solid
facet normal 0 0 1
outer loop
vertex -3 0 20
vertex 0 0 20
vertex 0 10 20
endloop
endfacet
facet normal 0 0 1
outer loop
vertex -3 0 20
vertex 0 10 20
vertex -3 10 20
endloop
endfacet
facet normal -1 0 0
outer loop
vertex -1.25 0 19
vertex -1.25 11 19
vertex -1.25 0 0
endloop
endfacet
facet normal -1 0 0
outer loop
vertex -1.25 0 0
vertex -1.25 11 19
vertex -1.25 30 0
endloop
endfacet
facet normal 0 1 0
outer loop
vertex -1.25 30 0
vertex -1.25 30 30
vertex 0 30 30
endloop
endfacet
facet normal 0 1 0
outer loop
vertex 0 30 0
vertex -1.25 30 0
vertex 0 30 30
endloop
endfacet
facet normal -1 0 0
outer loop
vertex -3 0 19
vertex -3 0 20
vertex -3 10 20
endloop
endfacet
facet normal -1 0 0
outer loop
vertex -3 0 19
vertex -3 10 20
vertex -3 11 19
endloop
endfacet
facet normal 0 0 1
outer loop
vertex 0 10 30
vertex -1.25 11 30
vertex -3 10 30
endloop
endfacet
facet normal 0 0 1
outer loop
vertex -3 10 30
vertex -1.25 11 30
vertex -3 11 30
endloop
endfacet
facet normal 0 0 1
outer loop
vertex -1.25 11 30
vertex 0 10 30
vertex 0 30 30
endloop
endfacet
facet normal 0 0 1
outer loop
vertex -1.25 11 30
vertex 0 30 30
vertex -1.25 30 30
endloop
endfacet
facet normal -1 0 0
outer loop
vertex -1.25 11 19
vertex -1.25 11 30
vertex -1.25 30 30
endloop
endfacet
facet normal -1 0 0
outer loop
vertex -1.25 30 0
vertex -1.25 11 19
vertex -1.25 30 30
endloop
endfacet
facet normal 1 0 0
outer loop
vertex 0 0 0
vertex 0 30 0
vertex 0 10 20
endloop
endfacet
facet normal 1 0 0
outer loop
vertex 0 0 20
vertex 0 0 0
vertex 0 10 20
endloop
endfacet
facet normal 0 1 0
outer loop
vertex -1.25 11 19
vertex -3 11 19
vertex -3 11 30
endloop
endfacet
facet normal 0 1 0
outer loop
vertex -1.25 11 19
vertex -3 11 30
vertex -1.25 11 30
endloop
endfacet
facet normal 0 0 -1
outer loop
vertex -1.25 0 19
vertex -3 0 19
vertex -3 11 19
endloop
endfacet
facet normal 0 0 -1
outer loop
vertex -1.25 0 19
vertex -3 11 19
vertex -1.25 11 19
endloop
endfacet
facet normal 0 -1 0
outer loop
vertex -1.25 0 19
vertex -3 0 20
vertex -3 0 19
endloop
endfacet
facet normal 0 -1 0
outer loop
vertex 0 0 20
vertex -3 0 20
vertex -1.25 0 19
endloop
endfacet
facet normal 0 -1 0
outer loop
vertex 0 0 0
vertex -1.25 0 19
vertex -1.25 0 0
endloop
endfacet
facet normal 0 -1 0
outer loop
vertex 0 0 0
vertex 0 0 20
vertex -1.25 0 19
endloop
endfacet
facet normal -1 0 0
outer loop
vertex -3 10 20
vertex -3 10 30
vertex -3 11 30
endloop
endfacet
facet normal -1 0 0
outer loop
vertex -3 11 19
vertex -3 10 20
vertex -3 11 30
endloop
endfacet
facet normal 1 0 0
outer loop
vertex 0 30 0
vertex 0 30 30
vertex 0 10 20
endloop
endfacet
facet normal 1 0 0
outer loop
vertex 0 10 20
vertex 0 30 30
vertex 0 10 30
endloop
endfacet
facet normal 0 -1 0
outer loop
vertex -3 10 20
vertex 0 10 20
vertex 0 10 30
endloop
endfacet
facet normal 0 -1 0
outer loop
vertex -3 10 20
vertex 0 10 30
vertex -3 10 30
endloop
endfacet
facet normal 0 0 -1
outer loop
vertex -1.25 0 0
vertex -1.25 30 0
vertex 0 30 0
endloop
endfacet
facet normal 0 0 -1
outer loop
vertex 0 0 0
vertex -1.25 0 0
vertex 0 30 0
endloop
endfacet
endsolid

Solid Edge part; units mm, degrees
sketch "Sketch1" plane through (0, 0, 0) normal (1, 0, 0) x (0, 1, 0)
  line L0 (10, 20) -> (10, 30)
  line L1 (0, 20) -> (10, 20)
  dimension "D1" = 10
sketch "Sketch2" plane through (0, 0, 0) normal (0, -1, 0) x (1, 0, 0)
  line L0 (0, 20) -> (-3, 20)
  line L1 (-3, 20) -> (-3, 19)
  line L2 (-3, 19) -> (-1.25, 19)
  line L3 (-1.25, 19) -> (-1.25, 0)
  line L4 (-1.25, 0) -> (0, 0)
  line L5 (0, 0) -> (0, 20)
sweep "ProtrusioneScorrimento_3" add profiles "Sketch2" path "Sketch1"
